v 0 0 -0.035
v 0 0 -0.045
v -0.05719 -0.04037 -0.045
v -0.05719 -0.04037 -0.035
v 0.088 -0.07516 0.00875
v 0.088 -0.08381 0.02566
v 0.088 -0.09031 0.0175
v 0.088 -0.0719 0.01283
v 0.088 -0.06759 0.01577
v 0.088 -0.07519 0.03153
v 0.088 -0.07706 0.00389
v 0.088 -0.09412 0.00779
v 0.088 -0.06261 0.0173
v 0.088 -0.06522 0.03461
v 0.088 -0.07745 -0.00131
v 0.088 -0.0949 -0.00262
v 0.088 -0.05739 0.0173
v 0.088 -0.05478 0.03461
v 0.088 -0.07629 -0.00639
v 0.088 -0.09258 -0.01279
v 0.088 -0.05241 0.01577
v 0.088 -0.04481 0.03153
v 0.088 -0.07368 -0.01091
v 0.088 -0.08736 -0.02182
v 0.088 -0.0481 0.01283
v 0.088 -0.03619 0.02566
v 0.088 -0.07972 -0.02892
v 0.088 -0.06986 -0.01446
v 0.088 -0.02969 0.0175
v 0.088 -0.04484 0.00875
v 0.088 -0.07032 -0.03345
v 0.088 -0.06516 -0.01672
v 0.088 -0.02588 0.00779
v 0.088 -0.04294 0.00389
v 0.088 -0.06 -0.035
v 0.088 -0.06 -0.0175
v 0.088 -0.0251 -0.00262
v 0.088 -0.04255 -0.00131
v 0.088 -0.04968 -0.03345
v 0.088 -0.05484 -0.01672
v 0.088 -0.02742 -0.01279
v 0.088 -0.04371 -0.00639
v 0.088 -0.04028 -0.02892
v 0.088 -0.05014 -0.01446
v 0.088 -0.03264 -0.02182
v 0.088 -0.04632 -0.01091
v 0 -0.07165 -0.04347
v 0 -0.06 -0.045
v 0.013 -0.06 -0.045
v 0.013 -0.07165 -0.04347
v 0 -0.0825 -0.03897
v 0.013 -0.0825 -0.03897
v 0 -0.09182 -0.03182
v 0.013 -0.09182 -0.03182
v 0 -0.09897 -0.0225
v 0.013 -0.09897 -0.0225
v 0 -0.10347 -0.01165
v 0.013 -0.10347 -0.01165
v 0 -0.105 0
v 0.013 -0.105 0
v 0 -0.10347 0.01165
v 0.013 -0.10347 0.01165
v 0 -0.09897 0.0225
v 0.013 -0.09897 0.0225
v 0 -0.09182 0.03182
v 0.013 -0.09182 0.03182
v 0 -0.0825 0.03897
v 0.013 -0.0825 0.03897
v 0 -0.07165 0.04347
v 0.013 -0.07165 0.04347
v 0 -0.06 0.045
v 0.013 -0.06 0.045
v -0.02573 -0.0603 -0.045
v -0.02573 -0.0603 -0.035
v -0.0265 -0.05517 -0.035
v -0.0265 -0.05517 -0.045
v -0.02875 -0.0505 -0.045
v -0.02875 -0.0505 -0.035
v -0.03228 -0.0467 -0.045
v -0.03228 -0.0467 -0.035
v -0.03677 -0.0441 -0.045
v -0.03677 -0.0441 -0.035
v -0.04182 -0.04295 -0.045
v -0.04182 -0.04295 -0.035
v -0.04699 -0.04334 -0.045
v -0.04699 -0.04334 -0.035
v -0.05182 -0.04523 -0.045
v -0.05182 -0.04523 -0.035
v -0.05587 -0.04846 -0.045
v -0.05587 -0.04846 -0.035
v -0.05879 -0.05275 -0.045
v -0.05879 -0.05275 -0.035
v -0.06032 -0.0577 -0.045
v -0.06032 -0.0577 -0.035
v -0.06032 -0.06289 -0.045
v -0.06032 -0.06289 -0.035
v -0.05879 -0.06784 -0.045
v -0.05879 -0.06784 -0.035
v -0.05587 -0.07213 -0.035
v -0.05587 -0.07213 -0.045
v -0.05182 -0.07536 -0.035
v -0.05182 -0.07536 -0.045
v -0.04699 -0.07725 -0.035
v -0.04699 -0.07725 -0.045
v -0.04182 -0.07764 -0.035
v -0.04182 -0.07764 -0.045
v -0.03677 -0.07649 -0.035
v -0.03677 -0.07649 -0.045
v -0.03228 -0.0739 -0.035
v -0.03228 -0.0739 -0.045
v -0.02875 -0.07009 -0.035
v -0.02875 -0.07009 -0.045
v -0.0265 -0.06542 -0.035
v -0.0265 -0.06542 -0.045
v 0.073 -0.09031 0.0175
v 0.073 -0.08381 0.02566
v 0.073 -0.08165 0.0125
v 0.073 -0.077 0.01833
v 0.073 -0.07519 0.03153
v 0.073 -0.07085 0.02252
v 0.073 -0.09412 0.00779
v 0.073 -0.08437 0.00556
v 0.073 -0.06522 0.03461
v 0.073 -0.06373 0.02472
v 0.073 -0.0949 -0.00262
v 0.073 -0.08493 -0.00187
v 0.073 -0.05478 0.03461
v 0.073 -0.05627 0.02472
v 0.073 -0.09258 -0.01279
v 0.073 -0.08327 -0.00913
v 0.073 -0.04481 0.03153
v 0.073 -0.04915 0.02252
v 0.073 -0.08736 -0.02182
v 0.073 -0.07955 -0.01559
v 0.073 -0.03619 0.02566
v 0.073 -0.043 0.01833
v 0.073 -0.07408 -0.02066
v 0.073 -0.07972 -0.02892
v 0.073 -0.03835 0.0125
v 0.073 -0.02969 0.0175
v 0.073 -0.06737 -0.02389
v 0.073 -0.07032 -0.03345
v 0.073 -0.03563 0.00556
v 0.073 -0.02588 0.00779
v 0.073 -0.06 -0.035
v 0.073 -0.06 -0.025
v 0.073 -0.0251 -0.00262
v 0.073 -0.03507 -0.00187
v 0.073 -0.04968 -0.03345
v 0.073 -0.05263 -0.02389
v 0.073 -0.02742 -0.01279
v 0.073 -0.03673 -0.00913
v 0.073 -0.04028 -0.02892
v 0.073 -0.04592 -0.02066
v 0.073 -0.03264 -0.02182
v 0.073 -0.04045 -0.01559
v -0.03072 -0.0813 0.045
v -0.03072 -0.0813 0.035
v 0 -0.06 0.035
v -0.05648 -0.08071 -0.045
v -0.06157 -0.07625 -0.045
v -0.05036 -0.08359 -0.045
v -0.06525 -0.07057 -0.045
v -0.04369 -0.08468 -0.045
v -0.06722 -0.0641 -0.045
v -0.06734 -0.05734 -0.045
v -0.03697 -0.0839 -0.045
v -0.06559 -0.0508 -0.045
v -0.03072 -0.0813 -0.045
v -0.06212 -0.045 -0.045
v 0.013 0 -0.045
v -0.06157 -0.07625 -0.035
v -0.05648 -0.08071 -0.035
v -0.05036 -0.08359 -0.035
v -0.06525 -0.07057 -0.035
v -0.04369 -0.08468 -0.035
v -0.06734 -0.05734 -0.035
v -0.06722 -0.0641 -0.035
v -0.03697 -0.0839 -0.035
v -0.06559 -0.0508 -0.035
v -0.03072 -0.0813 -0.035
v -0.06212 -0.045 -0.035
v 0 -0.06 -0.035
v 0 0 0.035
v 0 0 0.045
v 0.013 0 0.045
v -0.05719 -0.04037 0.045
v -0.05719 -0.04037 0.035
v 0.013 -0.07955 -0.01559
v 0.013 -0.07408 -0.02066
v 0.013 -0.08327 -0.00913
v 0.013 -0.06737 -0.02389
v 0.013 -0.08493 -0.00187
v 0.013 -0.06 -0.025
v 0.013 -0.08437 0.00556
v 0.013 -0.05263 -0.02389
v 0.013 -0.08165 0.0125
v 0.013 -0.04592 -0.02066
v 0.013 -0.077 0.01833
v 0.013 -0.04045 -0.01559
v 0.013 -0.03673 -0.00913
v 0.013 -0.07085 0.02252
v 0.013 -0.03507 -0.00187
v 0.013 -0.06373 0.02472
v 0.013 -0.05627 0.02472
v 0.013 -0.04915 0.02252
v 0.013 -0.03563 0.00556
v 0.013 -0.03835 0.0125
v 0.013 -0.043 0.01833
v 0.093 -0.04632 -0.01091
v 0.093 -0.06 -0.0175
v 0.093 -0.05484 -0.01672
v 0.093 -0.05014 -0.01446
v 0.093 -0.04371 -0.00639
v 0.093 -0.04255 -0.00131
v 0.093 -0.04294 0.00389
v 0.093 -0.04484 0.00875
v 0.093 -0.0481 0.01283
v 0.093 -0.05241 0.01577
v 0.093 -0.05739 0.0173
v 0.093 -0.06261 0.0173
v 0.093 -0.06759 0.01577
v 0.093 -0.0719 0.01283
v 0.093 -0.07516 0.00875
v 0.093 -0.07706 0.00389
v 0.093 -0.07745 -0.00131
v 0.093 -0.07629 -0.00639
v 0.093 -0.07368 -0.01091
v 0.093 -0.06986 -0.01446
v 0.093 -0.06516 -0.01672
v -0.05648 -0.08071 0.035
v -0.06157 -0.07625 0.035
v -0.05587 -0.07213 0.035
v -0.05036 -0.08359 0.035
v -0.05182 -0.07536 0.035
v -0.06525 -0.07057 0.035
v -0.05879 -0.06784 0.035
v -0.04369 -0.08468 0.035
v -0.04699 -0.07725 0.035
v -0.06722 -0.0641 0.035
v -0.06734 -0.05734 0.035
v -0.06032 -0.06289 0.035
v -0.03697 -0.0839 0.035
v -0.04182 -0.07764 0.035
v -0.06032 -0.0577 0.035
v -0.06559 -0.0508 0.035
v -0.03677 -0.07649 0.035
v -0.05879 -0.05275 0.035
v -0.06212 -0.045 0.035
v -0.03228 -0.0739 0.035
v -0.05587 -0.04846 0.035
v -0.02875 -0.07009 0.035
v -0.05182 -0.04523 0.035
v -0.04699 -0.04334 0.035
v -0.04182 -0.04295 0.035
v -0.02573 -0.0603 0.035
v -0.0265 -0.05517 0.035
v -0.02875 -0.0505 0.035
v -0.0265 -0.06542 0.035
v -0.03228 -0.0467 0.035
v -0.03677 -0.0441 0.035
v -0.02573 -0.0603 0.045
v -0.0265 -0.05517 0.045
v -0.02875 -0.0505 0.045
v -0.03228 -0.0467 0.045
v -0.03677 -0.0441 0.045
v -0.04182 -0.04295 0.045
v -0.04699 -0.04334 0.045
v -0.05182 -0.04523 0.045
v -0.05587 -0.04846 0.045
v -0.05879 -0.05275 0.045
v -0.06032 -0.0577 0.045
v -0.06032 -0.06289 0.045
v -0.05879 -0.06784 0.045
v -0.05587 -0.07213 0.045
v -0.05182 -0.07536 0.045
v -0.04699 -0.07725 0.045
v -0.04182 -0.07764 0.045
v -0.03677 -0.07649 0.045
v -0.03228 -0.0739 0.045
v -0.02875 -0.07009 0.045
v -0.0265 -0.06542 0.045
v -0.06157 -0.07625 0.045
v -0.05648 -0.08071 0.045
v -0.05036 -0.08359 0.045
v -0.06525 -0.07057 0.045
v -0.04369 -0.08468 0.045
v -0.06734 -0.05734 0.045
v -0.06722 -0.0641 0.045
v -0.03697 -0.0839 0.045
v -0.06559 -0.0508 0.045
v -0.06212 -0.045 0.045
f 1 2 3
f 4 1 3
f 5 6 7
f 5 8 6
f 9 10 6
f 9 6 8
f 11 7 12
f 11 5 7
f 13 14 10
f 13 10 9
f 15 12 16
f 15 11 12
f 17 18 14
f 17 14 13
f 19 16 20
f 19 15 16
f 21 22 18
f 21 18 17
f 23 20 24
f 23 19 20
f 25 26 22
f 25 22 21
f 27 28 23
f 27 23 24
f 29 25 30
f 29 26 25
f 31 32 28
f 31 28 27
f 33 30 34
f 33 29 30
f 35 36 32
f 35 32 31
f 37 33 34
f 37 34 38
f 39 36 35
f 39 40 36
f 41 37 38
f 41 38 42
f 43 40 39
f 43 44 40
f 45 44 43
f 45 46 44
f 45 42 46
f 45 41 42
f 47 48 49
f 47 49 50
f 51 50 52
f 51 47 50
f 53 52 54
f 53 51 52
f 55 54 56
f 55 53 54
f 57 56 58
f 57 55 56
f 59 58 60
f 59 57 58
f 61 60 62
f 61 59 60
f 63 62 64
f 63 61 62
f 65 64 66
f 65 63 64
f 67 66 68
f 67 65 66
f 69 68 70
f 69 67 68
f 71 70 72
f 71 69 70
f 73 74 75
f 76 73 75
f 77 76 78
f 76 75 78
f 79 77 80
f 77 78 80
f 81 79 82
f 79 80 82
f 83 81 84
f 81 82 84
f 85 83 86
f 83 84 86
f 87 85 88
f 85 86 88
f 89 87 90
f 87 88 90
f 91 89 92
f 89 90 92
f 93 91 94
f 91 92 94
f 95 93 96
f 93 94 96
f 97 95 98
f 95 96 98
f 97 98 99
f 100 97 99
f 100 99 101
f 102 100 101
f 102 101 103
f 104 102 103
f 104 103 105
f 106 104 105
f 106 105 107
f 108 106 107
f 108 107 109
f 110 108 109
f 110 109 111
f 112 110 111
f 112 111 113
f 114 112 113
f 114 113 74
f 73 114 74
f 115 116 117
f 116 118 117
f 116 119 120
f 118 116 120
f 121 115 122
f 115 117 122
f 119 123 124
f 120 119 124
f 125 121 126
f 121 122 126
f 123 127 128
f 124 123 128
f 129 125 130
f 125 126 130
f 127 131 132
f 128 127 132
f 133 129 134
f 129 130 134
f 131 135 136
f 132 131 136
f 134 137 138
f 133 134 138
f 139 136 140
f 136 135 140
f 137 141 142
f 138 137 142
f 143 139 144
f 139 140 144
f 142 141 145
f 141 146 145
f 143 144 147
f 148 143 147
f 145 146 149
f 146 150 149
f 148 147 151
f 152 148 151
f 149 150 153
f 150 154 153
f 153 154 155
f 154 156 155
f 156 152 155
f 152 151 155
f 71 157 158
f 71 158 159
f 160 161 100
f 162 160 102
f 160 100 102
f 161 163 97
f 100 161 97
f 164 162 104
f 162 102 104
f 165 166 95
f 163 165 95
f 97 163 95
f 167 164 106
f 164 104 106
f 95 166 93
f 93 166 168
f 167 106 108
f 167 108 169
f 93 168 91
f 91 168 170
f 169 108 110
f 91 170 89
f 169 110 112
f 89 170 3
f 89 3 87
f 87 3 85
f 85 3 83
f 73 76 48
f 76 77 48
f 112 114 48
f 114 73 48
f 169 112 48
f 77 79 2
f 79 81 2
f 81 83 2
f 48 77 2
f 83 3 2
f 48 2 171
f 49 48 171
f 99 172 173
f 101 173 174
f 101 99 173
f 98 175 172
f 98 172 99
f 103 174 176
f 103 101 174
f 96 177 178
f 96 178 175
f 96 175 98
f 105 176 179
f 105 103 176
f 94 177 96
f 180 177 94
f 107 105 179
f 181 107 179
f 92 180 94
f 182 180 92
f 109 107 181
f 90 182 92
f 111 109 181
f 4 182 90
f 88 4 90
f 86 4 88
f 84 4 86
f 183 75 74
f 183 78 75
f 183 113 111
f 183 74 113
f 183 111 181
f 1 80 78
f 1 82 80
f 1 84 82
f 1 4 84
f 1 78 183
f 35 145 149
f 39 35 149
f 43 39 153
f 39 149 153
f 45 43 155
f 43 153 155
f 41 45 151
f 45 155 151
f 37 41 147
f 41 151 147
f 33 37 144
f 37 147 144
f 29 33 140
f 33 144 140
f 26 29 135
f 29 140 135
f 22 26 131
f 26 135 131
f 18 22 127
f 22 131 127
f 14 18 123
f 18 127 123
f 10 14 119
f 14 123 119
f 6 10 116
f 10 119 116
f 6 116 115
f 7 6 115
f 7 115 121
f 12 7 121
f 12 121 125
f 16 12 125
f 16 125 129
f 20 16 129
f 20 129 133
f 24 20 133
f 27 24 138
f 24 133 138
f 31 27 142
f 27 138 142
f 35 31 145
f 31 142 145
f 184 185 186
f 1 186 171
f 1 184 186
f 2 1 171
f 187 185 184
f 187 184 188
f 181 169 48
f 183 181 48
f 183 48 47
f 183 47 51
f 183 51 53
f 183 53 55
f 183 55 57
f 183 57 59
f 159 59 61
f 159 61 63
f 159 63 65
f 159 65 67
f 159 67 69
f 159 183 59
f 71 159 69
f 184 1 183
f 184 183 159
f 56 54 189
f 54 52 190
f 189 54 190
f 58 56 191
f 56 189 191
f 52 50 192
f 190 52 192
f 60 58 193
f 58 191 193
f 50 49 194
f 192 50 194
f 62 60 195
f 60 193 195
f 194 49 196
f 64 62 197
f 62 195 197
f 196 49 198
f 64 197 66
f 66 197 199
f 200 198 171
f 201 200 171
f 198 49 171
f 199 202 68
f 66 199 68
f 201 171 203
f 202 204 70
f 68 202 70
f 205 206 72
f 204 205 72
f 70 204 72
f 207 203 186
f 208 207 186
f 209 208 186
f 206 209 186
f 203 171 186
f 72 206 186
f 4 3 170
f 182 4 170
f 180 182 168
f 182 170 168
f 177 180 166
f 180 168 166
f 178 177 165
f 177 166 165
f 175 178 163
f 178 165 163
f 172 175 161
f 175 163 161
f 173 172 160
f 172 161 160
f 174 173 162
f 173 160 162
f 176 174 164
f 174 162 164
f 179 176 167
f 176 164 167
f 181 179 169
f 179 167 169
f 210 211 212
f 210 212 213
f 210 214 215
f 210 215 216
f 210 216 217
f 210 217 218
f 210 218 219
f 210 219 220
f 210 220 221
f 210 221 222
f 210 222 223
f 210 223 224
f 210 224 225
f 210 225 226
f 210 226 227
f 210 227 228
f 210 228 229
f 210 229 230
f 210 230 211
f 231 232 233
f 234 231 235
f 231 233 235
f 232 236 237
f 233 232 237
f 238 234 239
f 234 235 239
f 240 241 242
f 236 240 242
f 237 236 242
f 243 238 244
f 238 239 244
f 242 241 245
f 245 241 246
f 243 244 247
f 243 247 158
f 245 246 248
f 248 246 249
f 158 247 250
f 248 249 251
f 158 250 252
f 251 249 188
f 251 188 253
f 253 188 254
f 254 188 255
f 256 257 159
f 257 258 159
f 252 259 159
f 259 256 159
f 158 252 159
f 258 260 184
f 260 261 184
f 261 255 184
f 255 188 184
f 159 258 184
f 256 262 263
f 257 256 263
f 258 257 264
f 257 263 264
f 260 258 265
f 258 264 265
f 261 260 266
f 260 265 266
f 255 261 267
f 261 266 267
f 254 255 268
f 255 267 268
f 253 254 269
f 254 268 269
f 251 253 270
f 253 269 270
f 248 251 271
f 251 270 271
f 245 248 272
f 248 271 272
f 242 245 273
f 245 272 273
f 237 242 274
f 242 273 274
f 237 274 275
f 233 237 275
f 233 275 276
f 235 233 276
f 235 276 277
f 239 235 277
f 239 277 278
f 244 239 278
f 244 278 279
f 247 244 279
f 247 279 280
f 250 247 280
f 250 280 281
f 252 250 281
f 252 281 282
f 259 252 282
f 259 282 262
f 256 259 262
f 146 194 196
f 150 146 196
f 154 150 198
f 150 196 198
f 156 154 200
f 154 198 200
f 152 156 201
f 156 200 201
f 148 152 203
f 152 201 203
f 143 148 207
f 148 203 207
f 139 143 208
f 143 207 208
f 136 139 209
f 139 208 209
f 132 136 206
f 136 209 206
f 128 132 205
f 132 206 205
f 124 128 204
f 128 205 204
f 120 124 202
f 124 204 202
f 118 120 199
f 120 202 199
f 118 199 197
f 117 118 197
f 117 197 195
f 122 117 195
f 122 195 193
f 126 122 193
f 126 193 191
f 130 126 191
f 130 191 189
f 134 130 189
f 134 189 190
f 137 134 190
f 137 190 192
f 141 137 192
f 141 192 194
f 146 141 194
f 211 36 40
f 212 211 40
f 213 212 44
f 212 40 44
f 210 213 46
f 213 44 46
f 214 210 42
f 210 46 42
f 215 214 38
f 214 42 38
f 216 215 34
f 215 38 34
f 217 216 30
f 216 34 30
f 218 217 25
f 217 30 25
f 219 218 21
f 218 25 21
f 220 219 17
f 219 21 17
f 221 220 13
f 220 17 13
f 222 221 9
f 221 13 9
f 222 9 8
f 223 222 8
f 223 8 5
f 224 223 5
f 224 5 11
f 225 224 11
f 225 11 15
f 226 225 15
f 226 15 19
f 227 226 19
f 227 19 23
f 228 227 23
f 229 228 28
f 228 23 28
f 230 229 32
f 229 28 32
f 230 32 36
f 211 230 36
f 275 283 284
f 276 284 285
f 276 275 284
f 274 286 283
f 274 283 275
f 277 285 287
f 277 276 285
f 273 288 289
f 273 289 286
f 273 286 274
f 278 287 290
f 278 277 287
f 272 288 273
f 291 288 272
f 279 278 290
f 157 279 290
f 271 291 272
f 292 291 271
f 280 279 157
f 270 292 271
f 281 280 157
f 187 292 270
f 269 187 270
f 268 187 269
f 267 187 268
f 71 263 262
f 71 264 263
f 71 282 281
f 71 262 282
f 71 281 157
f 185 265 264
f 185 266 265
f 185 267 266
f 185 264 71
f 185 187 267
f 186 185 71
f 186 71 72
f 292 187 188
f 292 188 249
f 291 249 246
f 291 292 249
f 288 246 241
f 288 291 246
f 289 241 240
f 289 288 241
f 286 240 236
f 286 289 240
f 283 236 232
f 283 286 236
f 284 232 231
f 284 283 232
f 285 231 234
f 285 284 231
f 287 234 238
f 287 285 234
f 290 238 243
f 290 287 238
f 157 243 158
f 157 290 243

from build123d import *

# Parameters (mm, degrees)
BOSS_EXTRUDE1_DEPTH = 0.013
SKETCH2_R           = 0.025
BOSS_EXTRUDE2_DEPTH = 0.075
SKETCH3_R           = 0.035
SKETCH3_R_2         = 0.025
BOSS_EXTRUDE3_DEPTH = 0.015
SKETCH4_R           = 0.0175
BOSS_EXTRUDE4_DEPTH = 0.005
BOSS_EXTRUDE5_DEPTH = 0.01
SKETCH6_R           = 0.01739422
CUT_EXTRUDE1_DEPTH  = 1.166655333


with BuildPart() as part:
    # Sketch1 → Boss-Extrude1 (new body)
    with BuildSketch(Plane(origin=(0, 0, 0), x_dir=(0, 0, -1), z_dir=(1, 0, 0))):
        with BuildLine():
            Line((-0.045, 0), (0.045, 0))
            Line((0.045, 0), (0.045, -0.06))
            ThreePointArc((0.045, -0.06), (0, -0.105), (-0.045, -0.06))
            Line((-0.045, -0.06), (-0.045, 0))
        make_face()
    extrude(amount=BOSS_EXTRUDE1_DEPTH)

    # Sketch2 → Boss-Extrude2 (add)
    with BuildSketch(Plane(origin=(0.013, 0, 0), x_dir=(0, 0, -1), z_dir=(1, 0, 0))):
        with Locations((0, -0.06)):
            Circle(SKETCH2_R)
    extrude(amount=BOSS_EXTRUDE2_DEPTH)

    # Sketch3 → Boss-Extrude3 (add)
    with BuildSketch(Plane(origin=(0.073, 0, 0), x_dir=(0, 0, -1), z_dir=(1, 0, 0))):
        with Locations((0, -0.06)):
            Circle(SKETCH3_R)
        with Locations((0, -0.06)):
            Circle(SKETCH3_R_2, mode=Mode.SUBTRACT)
    extrude(amount=BOSS_EXTRUDE3_DEPTH)

    # Sketch4 → Boss-Extrude4 (add)
    with BuildSketch(Plane(origin=(0.088, 0, 0), x_dir=(0, 0, -1), z_dir=(1, 0, 0))):
        with Locations((0, -0.06)):
            Circle(SKETCH4_R)
    extrude(amount=BOSS_EXTRUDE4_DEPTH)

    # Sketch5 → Boss-Extrude5 (add)
    with BuildSketch(Plane(origin=(0, 0, -0.045), x_dir=(-1, 0, 0), z_dir=(0, 0, -1))):
        with BuildLine():
            Line((0, 0), (0.057189107, -0.040365902))
            ThreePointArc((0.057189107, -0.040365902), (0.063607261, -0.073540807), (0.030720733, -0.081302466))
            Line((0.030720733, -0.081302466), (0, -0.06))
            Line((0, -0.06), (-0.013, -0.06))
            Line((-0.013, -0.06), (-0.013, 0))
            Line((-0.013, 0), (0, 0))
        make_face()
    boss_extrude5 = extrude(amount=-BOSS_EXTRUDE5_DEPTH)

    # Mirror1: Boss-Extrude5 across plane
    add(boss_extrude5.mirror(Plane.XY))

    # Sketch6 → Cut-Extrude1 (cut, through all)
    with BuildSketch(Plane.XY.offset(0.045)):
        with Locations((-0.04312204, -0.060295668)):
            Circle(SKETCH6_R)
    extrude(amount=-CUT_EXTRUDE1_DEPTH, mode=Mode.SUBTRACT)


solid = part.part
